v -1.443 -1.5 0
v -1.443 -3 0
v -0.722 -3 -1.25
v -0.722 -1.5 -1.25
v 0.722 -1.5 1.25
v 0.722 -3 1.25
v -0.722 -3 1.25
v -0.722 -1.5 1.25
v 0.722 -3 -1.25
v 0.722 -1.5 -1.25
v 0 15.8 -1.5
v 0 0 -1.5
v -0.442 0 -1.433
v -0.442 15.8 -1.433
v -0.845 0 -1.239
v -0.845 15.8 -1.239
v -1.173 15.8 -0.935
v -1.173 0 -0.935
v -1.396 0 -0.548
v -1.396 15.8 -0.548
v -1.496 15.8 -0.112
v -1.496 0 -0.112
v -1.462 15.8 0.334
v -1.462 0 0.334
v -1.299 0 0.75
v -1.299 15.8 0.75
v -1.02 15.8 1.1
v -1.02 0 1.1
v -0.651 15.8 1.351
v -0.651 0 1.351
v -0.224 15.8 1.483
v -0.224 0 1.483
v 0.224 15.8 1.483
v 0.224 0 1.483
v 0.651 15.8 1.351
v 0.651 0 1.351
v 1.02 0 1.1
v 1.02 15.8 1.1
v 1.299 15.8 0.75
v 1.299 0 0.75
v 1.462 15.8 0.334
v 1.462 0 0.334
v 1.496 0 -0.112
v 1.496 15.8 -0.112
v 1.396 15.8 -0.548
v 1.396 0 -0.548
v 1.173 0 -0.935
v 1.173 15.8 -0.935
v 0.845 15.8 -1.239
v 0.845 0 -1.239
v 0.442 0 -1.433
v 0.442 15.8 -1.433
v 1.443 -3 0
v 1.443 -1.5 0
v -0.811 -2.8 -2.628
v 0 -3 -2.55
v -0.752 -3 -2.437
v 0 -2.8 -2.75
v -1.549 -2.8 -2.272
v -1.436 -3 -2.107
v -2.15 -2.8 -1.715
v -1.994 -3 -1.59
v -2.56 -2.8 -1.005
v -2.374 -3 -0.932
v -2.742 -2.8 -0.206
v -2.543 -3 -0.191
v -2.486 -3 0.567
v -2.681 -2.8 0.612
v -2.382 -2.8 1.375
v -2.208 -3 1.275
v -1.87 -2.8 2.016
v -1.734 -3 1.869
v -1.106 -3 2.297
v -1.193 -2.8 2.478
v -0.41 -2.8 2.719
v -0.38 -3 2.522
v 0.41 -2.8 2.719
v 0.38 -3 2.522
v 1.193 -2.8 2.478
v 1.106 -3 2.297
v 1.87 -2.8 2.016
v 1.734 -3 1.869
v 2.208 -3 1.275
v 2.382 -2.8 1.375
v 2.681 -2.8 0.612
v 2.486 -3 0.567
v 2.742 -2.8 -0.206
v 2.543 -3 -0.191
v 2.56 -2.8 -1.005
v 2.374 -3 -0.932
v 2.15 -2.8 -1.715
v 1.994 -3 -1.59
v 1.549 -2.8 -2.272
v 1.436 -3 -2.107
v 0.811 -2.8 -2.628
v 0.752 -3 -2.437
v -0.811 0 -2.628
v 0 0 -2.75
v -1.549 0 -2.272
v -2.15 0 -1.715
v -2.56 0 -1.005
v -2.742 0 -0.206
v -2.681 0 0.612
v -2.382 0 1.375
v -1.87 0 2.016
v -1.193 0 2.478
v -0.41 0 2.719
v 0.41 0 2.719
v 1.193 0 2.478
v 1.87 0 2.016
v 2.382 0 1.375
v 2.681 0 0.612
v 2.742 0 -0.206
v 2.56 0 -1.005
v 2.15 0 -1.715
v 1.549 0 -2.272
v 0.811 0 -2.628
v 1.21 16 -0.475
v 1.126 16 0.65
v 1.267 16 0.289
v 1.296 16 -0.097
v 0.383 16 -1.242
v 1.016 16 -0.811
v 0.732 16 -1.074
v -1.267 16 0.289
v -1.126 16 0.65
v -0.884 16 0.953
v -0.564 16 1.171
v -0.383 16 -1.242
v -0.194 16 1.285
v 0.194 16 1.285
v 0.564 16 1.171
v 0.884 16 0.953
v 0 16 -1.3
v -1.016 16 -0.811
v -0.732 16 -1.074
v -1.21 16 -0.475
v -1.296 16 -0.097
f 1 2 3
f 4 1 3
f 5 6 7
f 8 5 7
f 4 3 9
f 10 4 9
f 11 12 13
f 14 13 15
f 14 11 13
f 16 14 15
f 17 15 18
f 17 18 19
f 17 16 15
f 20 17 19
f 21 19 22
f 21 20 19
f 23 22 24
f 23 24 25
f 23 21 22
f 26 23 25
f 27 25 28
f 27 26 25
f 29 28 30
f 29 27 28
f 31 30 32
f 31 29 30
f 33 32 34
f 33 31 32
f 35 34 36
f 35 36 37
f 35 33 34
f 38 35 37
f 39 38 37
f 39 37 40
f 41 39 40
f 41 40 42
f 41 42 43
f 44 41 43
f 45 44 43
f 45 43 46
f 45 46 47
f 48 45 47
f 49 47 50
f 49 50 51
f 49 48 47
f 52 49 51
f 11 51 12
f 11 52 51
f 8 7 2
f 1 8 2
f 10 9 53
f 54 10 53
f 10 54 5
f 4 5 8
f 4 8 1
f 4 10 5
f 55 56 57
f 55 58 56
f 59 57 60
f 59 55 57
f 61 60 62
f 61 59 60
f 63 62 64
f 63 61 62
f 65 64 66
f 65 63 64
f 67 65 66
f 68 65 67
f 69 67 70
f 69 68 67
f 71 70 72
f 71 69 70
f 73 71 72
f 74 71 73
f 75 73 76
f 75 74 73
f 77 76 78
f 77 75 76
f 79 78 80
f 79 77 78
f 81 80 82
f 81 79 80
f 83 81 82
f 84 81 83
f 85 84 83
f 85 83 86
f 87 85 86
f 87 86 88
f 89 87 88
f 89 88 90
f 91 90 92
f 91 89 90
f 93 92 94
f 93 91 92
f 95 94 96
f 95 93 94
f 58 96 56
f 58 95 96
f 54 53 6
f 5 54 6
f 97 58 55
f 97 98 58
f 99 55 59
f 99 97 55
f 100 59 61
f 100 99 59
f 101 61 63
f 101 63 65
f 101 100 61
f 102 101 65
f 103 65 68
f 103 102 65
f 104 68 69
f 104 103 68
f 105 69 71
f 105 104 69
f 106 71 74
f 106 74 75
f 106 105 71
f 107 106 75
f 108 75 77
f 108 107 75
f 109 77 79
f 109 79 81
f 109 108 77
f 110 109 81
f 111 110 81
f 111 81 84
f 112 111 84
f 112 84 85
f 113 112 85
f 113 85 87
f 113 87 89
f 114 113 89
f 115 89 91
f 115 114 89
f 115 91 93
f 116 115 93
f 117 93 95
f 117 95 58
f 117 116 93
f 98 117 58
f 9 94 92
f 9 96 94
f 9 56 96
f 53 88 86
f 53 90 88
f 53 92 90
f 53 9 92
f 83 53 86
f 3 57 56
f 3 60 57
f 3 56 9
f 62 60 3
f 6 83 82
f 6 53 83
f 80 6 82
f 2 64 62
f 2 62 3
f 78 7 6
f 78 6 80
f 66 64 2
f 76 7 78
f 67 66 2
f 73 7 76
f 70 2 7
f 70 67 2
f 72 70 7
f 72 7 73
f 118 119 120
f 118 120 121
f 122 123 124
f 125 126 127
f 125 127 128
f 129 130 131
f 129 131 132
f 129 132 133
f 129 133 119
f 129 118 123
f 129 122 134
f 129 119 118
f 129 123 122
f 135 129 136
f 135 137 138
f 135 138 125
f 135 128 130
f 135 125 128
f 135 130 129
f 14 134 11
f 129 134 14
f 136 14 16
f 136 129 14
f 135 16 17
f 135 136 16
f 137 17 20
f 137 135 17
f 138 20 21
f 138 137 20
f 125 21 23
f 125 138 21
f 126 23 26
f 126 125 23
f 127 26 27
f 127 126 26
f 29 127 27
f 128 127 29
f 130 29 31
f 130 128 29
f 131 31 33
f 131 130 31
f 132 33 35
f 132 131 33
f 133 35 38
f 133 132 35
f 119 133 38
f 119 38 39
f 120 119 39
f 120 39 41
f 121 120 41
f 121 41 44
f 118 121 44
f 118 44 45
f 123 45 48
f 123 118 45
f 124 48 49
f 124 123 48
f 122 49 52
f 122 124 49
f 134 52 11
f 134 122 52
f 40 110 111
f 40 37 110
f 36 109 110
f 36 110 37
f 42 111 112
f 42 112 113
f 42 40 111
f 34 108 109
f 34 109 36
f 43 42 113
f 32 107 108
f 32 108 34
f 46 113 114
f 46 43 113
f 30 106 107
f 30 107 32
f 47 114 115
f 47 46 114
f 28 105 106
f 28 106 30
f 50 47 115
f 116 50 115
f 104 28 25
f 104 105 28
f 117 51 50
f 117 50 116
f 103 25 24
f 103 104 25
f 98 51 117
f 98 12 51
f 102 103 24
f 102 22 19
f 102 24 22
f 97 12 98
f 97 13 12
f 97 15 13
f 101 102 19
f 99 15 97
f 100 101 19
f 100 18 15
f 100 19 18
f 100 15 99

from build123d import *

# Parameters (mm, degrees)
SIMPLIFIED_START                    = -3
SIMPLIFIED_NOMINAL_HEX_SOCKET_DEPTH = 1.5


with BuildPart() as part:
    # Reconstructed nominal axial profile → Native revolved geometry (revolve)
    with BuildSketch(Plane.XY, mode=Mode.PRIVATE) as native_revolved_geometry_sk:
        Polygon((0, -3), (2.55, -3), (2.75, -2.8), (2.75, 0), (1.5, 0), (1.5, 15.8), (1.3, 16), (0, 16), align=None)
    revolve(native_revolved_geometry_sk.sketch.rotate(Axis((0, -500, 0), (0, 1, 0)), 90), axis=Axis((0, -500, 0), (0, 1, 0)))

    # Sketch2 → Simplified nominal hex socket (cut)
    with BuildSketch(Plane(origin=(0, 0, 0), x_dir=(1, 0, 0), z_dir=(0, 1, 0)).offset(SIMPLIFIED_START)):
        Polygon((1.443375673, 0), (0.721687836, -1.25), (-0.721687836, -1.25), (-1.443375673, 0), (-0.721687836, 1.25), (0.721687836, 1.25), align=None)
    extrude(amount=SIMPLIFIED_NOMINAL_HEX_SOCKET_DEPTH, mode=Mode.SUBTRACT)


solid = part.part
